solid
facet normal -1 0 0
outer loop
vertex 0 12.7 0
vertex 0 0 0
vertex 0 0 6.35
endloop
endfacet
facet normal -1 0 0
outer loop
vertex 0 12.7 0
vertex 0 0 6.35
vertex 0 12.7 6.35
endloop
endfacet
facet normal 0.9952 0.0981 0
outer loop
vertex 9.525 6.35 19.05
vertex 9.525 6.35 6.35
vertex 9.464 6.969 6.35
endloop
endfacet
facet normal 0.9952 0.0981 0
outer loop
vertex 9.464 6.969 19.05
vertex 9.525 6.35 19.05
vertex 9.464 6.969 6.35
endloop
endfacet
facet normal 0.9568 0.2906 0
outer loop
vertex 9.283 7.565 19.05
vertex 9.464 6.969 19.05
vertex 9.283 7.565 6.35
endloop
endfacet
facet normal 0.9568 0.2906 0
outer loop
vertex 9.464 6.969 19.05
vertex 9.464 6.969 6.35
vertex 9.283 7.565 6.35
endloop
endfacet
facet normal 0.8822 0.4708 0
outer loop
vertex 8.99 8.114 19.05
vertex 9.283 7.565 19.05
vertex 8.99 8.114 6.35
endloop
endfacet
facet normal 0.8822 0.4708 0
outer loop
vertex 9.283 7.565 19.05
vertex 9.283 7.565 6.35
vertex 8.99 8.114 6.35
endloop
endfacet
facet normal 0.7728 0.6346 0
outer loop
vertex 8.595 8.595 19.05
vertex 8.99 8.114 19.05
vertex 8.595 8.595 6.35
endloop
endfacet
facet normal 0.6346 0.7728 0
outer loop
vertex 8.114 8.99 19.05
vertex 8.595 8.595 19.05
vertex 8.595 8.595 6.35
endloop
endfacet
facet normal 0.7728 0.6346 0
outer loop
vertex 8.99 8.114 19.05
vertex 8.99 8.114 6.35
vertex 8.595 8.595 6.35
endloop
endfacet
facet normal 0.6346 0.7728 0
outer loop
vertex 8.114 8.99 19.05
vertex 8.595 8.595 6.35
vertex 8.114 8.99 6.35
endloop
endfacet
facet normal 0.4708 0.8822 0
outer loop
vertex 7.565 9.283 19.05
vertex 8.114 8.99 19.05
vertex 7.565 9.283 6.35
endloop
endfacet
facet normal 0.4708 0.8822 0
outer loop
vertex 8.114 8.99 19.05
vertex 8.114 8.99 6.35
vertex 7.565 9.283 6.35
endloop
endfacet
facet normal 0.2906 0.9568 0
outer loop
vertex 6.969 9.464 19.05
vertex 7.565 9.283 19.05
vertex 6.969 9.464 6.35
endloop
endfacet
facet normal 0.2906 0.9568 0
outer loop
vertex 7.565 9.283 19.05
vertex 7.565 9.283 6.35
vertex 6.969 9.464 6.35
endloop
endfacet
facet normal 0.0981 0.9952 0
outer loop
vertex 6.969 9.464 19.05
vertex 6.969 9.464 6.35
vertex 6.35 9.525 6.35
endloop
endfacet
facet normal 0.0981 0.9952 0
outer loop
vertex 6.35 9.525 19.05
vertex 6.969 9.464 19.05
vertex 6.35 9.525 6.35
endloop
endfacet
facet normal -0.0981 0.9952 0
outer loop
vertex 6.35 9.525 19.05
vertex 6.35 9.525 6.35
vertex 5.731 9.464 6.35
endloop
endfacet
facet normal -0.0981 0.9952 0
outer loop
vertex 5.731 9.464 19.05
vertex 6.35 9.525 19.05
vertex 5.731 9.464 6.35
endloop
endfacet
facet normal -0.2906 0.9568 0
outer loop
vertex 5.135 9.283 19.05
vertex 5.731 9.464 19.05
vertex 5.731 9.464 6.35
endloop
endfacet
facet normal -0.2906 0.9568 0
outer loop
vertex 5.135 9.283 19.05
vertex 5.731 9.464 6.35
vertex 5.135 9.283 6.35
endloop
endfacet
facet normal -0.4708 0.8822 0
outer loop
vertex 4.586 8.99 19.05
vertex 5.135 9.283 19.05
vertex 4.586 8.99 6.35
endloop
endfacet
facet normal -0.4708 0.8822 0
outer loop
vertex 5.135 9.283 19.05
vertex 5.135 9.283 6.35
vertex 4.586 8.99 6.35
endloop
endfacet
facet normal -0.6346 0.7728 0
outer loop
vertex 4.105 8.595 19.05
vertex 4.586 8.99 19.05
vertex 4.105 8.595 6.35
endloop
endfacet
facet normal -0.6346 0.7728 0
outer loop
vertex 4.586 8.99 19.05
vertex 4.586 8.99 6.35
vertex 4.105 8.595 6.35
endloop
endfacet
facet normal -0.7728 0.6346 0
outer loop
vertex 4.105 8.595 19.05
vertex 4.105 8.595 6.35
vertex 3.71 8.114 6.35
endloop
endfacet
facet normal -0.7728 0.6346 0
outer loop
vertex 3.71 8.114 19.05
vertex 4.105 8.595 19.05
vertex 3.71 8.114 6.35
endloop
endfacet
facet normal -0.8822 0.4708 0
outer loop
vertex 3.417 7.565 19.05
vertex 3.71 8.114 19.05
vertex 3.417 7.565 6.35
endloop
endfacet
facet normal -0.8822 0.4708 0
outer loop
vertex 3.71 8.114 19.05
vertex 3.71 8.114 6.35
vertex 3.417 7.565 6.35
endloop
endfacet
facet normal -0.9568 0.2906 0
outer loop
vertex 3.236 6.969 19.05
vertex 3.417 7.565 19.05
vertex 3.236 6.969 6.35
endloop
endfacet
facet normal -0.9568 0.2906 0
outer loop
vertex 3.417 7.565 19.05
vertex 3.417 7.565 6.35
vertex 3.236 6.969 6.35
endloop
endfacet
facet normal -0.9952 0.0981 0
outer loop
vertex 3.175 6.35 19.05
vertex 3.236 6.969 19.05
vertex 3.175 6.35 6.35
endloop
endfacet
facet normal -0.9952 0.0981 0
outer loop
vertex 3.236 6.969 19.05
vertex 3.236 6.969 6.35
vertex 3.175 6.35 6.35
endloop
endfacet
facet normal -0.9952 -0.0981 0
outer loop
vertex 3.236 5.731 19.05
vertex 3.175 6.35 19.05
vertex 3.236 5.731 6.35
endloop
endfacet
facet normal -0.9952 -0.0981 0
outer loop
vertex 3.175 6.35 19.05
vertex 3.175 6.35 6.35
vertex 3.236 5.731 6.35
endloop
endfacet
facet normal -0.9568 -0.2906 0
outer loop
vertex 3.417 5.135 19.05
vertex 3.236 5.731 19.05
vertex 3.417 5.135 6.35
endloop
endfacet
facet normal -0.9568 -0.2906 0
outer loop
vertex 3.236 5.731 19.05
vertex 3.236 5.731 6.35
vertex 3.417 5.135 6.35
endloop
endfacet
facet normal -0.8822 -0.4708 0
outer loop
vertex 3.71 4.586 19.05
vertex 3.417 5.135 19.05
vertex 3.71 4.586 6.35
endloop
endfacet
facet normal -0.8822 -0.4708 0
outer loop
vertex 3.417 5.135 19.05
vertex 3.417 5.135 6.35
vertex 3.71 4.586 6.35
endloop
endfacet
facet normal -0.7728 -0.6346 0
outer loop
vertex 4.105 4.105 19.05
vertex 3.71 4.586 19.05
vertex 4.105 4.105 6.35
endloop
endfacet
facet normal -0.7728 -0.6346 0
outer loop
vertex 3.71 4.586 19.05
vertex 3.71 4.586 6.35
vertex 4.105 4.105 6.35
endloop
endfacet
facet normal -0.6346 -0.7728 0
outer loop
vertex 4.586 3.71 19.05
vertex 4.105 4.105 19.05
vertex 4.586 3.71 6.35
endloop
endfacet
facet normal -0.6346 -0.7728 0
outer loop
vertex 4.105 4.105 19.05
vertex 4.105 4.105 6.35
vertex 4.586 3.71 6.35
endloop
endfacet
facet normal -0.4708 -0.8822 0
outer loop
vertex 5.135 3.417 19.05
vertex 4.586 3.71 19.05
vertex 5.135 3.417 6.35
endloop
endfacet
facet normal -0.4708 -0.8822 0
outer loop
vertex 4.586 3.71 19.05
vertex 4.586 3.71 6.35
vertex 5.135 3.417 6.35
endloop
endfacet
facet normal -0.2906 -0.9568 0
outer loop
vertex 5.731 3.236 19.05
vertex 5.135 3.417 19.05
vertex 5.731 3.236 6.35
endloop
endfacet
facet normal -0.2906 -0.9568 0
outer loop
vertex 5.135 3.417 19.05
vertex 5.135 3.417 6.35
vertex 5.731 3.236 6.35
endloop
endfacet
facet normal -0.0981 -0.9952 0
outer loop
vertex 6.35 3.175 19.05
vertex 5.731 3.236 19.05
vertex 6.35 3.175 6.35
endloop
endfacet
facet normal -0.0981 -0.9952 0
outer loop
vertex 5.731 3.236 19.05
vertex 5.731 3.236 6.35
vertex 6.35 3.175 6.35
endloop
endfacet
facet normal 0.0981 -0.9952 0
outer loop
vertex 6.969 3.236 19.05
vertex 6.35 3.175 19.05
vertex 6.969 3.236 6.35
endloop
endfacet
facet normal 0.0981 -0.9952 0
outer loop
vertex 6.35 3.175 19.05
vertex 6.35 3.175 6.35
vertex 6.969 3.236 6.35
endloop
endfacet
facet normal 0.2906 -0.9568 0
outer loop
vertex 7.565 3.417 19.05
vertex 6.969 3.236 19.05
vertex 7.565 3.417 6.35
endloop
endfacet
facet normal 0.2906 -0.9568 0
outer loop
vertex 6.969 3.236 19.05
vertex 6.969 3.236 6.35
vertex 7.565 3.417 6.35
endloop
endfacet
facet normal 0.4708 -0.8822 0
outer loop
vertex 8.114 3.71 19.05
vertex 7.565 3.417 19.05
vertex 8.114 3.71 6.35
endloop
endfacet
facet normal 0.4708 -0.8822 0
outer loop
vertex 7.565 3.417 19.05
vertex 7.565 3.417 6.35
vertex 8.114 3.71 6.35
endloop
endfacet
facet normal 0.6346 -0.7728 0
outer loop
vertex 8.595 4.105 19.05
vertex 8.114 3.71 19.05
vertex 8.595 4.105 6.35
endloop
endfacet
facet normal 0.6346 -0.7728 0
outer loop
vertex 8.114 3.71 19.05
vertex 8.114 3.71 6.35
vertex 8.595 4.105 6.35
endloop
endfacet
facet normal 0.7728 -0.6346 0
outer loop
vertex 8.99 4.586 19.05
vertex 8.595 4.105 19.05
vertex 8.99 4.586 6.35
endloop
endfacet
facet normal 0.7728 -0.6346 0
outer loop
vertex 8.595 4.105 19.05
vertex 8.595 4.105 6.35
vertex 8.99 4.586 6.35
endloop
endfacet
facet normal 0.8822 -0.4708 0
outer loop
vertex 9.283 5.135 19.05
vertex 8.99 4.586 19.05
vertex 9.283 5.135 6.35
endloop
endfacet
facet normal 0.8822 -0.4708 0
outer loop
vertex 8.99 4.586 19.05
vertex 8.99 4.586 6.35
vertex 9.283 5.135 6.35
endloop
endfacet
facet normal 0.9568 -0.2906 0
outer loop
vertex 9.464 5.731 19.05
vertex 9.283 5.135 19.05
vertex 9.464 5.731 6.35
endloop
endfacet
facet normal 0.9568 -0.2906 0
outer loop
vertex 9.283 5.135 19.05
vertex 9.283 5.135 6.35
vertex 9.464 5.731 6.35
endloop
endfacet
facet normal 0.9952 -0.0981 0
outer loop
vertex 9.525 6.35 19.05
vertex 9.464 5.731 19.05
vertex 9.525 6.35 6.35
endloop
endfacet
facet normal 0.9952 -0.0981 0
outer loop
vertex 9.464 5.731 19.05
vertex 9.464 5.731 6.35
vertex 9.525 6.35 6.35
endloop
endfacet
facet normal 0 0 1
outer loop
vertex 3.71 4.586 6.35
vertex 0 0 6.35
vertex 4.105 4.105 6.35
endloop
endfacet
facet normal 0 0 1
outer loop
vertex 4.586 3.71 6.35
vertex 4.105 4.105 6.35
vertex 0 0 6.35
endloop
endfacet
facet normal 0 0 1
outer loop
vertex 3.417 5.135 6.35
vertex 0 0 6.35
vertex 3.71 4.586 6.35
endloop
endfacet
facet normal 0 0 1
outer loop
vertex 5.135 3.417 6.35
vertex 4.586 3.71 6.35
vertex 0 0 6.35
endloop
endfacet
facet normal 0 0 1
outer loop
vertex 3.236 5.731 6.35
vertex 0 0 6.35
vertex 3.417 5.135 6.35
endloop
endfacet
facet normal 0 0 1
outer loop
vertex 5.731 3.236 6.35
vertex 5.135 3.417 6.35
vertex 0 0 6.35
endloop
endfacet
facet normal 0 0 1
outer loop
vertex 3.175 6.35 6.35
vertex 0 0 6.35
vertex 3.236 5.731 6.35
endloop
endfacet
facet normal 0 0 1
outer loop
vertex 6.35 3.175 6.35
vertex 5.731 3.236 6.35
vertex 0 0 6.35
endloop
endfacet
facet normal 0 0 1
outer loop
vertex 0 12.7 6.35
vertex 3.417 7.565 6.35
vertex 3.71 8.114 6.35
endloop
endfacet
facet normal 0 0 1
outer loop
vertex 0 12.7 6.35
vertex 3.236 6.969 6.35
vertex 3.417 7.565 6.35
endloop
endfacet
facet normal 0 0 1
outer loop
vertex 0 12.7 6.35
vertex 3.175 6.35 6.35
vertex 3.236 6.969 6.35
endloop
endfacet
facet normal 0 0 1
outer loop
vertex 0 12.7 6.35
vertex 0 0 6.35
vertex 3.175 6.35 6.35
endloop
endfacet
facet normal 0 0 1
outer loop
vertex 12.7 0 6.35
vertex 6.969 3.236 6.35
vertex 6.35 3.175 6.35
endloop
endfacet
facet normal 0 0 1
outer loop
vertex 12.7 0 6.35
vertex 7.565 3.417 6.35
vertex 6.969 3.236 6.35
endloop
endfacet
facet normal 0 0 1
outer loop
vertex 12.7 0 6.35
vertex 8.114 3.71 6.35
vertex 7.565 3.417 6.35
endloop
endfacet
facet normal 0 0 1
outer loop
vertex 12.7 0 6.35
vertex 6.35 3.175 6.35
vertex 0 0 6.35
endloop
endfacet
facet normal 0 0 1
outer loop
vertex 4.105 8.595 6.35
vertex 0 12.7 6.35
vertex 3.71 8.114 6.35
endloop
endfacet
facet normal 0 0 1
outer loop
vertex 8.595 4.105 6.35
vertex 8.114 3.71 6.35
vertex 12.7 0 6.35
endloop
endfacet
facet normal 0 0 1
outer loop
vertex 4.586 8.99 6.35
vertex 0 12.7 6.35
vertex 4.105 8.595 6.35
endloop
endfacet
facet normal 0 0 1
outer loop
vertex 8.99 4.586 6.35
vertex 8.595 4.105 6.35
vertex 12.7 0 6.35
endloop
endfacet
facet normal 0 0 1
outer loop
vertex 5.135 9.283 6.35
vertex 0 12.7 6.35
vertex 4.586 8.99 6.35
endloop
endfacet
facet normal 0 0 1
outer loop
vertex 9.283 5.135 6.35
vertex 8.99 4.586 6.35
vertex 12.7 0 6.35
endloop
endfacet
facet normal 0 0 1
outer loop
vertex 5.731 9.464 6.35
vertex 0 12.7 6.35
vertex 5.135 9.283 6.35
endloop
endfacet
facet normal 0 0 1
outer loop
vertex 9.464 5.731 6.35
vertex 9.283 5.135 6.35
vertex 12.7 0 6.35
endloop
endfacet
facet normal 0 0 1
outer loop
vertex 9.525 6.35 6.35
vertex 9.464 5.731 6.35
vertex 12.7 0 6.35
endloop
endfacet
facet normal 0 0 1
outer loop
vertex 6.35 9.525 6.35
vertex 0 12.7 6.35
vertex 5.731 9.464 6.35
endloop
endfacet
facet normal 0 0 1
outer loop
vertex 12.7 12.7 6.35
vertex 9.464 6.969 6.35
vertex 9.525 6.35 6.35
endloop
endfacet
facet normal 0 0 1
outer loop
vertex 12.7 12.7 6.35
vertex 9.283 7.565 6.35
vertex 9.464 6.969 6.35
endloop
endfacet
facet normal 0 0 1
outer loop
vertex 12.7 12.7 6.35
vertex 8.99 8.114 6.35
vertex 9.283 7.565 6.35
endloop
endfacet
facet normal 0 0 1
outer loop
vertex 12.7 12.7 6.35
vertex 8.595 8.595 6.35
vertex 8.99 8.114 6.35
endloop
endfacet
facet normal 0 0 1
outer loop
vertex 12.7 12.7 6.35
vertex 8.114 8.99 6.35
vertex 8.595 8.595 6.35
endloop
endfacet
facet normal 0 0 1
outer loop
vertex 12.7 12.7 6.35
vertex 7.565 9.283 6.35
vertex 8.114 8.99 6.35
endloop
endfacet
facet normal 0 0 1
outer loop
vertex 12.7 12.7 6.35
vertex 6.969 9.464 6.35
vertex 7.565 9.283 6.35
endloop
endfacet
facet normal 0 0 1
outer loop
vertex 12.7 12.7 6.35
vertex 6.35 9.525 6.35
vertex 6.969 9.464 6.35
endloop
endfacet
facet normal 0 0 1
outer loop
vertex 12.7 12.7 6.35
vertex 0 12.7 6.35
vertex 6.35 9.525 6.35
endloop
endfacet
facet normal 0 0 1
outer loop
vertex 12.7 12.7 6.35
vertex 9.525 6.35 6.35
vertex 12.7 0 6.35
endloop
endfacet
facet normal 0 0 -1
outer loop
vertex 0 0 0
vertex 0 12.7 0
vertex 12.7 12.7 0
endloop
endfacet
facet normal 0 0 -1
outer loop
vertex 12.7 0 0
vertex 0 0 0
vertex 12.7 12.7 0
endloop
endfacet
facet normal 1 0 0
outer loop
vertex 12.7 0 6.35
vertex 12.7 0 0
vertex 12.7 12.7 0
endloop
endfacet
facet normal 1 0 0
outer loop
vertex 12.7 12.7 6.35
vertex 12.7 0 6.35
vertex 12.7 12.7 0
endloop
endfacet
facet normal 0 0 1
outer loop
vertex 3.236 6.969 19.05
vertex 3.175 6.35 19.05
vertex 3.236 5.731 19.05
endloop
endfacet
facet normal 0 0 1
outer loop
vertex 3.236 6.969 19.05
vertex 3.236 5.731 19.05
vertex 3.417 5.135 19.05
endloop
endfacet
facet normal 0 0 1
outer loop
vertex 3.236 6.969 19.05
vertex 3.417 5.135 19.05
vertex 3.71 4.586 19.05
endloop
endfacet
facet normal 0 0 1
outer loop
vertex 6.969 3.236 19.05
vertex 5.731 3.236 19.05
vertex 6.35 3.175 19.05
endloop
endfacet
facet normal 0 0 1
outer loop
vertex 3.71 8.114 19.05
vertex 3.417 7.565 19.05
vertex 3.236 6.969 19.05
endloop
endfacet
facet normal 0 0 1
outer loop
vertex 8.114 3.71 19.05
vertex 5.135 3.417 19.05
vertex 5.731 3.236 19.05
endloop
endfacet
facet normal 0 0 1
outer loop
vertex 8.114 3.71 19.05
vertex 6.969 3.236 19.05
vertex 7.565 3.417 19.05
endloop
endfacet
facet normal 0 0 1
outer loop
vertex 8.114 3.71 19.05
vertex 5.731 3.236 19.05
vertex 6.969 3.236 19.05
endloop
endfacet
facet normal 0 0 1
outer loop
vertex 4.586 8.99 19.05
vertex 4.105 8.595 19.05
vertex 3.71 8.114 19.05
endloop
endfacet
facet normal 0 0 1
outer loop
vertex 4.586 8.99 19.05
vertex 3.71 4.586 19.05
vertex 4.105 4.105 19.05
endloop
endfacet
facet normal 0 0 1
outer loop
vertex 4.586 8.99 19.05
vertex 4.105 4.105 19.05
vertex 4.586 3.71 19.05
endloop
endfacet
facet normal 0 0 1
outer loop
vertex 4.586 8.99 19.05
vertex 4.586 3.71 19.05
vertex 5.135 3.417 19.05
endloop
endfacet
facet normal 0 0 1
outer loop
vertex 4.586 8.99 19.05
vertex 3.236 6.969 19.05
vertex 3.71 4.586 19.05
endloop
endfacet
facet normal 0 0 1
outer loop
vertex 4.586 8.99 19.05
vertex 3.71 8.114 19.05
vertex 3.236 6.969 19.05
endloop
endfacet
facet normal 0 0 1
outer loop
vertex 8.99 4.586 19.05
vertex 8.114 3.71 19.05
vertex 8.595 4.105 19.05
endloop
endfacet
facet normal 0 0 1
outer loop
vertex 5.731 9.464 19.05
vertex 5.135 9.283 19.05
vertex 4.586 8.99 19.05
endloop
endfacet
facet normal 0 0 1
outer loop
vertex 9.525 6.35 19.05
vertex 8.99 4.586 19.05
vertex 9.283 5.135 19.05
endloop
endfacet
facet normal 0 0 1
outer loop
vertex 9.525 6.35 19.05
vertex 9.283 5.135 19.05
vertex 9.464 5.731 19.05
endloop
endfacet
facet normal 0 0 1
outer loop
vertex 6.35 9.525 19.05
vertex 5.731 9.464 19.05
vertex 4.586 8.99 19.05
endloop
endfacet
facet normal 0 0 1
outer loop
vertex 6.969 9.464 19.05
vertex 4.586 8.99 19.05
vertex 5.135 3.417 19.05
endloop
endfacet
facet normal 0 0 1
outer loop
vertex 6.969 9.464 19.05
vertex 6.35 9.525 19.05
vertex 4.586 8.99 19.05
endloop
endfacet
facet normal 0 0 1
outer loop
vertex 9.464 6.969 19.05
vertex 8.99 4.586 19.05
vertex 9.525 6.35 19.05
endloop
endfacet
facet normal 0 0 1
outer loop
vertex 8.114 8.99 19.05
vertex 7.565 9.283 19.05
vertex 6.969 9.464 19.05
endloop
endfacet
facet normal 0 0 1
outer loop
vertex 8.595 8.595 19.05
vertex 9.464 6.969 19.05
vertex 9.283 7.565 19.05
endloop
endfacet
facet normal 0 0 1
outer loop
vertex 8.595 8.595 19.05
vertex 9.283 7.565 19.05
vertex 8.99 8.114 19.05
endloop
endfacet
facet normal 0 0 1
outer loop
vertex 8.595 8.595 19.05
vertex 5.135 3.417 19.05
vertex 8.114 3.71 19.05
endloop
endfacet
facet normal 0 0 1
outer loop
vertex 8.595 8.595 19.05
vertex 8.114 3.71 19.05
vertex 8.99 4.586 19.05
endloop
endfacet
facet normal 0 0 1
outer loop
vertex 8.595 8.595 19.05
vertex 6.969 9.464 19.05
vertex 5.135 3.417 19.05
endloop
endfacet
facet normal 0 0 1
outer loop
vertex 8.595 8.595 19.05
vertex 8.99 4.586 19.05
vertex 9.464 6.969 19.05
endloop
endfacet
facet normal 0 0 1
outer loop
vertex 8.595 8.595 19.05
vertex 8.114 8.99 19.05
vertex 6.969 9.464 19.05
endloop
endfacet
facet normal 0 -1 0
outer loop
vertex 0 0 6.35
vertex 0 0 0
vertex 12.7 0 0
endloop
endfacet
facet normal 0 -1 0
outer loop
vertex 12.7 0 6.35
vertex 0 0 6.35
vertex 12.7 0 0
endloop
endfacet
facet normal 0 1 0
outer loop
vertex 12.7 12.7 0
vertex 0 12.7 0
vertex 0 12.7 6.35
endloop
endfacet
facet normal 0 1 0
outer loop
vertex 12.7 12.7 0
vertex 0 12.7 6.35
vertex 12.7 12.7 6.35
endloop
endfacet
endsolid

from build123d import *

# Parameters (mm, degrees)
SKETCH2_W           = 12.7
SKETCH2_H           = 12.7
BOSS_EXTRUDE1_DEPTH = 6.35
SKETCH3_R           = 3.175
BOSS_EXTRUDE2_DEPTH = 12.7


with BuildPart() as part:
    # Sketch2 → Boss-Extrude1 (new body)
    with BuildSketch(Plane.XY):
        with Locations((6.35, 6.35)):
            Rectangle(SKETCH2_W, SKETCH2_H)
    extrude(amount=BOSS_EXTRUDE1_DEPTH)

    # Sketch3 → Boss-Extrude2 (add)
    with BuildSketch(Plane.XY.offset(6.35)):
        with Locations((6.35, 6.35)):
            Circle(SKETCH3_R)
    extrude(amount=BOSS_EXTRUDE2_DEPTH)


solid = part.part
